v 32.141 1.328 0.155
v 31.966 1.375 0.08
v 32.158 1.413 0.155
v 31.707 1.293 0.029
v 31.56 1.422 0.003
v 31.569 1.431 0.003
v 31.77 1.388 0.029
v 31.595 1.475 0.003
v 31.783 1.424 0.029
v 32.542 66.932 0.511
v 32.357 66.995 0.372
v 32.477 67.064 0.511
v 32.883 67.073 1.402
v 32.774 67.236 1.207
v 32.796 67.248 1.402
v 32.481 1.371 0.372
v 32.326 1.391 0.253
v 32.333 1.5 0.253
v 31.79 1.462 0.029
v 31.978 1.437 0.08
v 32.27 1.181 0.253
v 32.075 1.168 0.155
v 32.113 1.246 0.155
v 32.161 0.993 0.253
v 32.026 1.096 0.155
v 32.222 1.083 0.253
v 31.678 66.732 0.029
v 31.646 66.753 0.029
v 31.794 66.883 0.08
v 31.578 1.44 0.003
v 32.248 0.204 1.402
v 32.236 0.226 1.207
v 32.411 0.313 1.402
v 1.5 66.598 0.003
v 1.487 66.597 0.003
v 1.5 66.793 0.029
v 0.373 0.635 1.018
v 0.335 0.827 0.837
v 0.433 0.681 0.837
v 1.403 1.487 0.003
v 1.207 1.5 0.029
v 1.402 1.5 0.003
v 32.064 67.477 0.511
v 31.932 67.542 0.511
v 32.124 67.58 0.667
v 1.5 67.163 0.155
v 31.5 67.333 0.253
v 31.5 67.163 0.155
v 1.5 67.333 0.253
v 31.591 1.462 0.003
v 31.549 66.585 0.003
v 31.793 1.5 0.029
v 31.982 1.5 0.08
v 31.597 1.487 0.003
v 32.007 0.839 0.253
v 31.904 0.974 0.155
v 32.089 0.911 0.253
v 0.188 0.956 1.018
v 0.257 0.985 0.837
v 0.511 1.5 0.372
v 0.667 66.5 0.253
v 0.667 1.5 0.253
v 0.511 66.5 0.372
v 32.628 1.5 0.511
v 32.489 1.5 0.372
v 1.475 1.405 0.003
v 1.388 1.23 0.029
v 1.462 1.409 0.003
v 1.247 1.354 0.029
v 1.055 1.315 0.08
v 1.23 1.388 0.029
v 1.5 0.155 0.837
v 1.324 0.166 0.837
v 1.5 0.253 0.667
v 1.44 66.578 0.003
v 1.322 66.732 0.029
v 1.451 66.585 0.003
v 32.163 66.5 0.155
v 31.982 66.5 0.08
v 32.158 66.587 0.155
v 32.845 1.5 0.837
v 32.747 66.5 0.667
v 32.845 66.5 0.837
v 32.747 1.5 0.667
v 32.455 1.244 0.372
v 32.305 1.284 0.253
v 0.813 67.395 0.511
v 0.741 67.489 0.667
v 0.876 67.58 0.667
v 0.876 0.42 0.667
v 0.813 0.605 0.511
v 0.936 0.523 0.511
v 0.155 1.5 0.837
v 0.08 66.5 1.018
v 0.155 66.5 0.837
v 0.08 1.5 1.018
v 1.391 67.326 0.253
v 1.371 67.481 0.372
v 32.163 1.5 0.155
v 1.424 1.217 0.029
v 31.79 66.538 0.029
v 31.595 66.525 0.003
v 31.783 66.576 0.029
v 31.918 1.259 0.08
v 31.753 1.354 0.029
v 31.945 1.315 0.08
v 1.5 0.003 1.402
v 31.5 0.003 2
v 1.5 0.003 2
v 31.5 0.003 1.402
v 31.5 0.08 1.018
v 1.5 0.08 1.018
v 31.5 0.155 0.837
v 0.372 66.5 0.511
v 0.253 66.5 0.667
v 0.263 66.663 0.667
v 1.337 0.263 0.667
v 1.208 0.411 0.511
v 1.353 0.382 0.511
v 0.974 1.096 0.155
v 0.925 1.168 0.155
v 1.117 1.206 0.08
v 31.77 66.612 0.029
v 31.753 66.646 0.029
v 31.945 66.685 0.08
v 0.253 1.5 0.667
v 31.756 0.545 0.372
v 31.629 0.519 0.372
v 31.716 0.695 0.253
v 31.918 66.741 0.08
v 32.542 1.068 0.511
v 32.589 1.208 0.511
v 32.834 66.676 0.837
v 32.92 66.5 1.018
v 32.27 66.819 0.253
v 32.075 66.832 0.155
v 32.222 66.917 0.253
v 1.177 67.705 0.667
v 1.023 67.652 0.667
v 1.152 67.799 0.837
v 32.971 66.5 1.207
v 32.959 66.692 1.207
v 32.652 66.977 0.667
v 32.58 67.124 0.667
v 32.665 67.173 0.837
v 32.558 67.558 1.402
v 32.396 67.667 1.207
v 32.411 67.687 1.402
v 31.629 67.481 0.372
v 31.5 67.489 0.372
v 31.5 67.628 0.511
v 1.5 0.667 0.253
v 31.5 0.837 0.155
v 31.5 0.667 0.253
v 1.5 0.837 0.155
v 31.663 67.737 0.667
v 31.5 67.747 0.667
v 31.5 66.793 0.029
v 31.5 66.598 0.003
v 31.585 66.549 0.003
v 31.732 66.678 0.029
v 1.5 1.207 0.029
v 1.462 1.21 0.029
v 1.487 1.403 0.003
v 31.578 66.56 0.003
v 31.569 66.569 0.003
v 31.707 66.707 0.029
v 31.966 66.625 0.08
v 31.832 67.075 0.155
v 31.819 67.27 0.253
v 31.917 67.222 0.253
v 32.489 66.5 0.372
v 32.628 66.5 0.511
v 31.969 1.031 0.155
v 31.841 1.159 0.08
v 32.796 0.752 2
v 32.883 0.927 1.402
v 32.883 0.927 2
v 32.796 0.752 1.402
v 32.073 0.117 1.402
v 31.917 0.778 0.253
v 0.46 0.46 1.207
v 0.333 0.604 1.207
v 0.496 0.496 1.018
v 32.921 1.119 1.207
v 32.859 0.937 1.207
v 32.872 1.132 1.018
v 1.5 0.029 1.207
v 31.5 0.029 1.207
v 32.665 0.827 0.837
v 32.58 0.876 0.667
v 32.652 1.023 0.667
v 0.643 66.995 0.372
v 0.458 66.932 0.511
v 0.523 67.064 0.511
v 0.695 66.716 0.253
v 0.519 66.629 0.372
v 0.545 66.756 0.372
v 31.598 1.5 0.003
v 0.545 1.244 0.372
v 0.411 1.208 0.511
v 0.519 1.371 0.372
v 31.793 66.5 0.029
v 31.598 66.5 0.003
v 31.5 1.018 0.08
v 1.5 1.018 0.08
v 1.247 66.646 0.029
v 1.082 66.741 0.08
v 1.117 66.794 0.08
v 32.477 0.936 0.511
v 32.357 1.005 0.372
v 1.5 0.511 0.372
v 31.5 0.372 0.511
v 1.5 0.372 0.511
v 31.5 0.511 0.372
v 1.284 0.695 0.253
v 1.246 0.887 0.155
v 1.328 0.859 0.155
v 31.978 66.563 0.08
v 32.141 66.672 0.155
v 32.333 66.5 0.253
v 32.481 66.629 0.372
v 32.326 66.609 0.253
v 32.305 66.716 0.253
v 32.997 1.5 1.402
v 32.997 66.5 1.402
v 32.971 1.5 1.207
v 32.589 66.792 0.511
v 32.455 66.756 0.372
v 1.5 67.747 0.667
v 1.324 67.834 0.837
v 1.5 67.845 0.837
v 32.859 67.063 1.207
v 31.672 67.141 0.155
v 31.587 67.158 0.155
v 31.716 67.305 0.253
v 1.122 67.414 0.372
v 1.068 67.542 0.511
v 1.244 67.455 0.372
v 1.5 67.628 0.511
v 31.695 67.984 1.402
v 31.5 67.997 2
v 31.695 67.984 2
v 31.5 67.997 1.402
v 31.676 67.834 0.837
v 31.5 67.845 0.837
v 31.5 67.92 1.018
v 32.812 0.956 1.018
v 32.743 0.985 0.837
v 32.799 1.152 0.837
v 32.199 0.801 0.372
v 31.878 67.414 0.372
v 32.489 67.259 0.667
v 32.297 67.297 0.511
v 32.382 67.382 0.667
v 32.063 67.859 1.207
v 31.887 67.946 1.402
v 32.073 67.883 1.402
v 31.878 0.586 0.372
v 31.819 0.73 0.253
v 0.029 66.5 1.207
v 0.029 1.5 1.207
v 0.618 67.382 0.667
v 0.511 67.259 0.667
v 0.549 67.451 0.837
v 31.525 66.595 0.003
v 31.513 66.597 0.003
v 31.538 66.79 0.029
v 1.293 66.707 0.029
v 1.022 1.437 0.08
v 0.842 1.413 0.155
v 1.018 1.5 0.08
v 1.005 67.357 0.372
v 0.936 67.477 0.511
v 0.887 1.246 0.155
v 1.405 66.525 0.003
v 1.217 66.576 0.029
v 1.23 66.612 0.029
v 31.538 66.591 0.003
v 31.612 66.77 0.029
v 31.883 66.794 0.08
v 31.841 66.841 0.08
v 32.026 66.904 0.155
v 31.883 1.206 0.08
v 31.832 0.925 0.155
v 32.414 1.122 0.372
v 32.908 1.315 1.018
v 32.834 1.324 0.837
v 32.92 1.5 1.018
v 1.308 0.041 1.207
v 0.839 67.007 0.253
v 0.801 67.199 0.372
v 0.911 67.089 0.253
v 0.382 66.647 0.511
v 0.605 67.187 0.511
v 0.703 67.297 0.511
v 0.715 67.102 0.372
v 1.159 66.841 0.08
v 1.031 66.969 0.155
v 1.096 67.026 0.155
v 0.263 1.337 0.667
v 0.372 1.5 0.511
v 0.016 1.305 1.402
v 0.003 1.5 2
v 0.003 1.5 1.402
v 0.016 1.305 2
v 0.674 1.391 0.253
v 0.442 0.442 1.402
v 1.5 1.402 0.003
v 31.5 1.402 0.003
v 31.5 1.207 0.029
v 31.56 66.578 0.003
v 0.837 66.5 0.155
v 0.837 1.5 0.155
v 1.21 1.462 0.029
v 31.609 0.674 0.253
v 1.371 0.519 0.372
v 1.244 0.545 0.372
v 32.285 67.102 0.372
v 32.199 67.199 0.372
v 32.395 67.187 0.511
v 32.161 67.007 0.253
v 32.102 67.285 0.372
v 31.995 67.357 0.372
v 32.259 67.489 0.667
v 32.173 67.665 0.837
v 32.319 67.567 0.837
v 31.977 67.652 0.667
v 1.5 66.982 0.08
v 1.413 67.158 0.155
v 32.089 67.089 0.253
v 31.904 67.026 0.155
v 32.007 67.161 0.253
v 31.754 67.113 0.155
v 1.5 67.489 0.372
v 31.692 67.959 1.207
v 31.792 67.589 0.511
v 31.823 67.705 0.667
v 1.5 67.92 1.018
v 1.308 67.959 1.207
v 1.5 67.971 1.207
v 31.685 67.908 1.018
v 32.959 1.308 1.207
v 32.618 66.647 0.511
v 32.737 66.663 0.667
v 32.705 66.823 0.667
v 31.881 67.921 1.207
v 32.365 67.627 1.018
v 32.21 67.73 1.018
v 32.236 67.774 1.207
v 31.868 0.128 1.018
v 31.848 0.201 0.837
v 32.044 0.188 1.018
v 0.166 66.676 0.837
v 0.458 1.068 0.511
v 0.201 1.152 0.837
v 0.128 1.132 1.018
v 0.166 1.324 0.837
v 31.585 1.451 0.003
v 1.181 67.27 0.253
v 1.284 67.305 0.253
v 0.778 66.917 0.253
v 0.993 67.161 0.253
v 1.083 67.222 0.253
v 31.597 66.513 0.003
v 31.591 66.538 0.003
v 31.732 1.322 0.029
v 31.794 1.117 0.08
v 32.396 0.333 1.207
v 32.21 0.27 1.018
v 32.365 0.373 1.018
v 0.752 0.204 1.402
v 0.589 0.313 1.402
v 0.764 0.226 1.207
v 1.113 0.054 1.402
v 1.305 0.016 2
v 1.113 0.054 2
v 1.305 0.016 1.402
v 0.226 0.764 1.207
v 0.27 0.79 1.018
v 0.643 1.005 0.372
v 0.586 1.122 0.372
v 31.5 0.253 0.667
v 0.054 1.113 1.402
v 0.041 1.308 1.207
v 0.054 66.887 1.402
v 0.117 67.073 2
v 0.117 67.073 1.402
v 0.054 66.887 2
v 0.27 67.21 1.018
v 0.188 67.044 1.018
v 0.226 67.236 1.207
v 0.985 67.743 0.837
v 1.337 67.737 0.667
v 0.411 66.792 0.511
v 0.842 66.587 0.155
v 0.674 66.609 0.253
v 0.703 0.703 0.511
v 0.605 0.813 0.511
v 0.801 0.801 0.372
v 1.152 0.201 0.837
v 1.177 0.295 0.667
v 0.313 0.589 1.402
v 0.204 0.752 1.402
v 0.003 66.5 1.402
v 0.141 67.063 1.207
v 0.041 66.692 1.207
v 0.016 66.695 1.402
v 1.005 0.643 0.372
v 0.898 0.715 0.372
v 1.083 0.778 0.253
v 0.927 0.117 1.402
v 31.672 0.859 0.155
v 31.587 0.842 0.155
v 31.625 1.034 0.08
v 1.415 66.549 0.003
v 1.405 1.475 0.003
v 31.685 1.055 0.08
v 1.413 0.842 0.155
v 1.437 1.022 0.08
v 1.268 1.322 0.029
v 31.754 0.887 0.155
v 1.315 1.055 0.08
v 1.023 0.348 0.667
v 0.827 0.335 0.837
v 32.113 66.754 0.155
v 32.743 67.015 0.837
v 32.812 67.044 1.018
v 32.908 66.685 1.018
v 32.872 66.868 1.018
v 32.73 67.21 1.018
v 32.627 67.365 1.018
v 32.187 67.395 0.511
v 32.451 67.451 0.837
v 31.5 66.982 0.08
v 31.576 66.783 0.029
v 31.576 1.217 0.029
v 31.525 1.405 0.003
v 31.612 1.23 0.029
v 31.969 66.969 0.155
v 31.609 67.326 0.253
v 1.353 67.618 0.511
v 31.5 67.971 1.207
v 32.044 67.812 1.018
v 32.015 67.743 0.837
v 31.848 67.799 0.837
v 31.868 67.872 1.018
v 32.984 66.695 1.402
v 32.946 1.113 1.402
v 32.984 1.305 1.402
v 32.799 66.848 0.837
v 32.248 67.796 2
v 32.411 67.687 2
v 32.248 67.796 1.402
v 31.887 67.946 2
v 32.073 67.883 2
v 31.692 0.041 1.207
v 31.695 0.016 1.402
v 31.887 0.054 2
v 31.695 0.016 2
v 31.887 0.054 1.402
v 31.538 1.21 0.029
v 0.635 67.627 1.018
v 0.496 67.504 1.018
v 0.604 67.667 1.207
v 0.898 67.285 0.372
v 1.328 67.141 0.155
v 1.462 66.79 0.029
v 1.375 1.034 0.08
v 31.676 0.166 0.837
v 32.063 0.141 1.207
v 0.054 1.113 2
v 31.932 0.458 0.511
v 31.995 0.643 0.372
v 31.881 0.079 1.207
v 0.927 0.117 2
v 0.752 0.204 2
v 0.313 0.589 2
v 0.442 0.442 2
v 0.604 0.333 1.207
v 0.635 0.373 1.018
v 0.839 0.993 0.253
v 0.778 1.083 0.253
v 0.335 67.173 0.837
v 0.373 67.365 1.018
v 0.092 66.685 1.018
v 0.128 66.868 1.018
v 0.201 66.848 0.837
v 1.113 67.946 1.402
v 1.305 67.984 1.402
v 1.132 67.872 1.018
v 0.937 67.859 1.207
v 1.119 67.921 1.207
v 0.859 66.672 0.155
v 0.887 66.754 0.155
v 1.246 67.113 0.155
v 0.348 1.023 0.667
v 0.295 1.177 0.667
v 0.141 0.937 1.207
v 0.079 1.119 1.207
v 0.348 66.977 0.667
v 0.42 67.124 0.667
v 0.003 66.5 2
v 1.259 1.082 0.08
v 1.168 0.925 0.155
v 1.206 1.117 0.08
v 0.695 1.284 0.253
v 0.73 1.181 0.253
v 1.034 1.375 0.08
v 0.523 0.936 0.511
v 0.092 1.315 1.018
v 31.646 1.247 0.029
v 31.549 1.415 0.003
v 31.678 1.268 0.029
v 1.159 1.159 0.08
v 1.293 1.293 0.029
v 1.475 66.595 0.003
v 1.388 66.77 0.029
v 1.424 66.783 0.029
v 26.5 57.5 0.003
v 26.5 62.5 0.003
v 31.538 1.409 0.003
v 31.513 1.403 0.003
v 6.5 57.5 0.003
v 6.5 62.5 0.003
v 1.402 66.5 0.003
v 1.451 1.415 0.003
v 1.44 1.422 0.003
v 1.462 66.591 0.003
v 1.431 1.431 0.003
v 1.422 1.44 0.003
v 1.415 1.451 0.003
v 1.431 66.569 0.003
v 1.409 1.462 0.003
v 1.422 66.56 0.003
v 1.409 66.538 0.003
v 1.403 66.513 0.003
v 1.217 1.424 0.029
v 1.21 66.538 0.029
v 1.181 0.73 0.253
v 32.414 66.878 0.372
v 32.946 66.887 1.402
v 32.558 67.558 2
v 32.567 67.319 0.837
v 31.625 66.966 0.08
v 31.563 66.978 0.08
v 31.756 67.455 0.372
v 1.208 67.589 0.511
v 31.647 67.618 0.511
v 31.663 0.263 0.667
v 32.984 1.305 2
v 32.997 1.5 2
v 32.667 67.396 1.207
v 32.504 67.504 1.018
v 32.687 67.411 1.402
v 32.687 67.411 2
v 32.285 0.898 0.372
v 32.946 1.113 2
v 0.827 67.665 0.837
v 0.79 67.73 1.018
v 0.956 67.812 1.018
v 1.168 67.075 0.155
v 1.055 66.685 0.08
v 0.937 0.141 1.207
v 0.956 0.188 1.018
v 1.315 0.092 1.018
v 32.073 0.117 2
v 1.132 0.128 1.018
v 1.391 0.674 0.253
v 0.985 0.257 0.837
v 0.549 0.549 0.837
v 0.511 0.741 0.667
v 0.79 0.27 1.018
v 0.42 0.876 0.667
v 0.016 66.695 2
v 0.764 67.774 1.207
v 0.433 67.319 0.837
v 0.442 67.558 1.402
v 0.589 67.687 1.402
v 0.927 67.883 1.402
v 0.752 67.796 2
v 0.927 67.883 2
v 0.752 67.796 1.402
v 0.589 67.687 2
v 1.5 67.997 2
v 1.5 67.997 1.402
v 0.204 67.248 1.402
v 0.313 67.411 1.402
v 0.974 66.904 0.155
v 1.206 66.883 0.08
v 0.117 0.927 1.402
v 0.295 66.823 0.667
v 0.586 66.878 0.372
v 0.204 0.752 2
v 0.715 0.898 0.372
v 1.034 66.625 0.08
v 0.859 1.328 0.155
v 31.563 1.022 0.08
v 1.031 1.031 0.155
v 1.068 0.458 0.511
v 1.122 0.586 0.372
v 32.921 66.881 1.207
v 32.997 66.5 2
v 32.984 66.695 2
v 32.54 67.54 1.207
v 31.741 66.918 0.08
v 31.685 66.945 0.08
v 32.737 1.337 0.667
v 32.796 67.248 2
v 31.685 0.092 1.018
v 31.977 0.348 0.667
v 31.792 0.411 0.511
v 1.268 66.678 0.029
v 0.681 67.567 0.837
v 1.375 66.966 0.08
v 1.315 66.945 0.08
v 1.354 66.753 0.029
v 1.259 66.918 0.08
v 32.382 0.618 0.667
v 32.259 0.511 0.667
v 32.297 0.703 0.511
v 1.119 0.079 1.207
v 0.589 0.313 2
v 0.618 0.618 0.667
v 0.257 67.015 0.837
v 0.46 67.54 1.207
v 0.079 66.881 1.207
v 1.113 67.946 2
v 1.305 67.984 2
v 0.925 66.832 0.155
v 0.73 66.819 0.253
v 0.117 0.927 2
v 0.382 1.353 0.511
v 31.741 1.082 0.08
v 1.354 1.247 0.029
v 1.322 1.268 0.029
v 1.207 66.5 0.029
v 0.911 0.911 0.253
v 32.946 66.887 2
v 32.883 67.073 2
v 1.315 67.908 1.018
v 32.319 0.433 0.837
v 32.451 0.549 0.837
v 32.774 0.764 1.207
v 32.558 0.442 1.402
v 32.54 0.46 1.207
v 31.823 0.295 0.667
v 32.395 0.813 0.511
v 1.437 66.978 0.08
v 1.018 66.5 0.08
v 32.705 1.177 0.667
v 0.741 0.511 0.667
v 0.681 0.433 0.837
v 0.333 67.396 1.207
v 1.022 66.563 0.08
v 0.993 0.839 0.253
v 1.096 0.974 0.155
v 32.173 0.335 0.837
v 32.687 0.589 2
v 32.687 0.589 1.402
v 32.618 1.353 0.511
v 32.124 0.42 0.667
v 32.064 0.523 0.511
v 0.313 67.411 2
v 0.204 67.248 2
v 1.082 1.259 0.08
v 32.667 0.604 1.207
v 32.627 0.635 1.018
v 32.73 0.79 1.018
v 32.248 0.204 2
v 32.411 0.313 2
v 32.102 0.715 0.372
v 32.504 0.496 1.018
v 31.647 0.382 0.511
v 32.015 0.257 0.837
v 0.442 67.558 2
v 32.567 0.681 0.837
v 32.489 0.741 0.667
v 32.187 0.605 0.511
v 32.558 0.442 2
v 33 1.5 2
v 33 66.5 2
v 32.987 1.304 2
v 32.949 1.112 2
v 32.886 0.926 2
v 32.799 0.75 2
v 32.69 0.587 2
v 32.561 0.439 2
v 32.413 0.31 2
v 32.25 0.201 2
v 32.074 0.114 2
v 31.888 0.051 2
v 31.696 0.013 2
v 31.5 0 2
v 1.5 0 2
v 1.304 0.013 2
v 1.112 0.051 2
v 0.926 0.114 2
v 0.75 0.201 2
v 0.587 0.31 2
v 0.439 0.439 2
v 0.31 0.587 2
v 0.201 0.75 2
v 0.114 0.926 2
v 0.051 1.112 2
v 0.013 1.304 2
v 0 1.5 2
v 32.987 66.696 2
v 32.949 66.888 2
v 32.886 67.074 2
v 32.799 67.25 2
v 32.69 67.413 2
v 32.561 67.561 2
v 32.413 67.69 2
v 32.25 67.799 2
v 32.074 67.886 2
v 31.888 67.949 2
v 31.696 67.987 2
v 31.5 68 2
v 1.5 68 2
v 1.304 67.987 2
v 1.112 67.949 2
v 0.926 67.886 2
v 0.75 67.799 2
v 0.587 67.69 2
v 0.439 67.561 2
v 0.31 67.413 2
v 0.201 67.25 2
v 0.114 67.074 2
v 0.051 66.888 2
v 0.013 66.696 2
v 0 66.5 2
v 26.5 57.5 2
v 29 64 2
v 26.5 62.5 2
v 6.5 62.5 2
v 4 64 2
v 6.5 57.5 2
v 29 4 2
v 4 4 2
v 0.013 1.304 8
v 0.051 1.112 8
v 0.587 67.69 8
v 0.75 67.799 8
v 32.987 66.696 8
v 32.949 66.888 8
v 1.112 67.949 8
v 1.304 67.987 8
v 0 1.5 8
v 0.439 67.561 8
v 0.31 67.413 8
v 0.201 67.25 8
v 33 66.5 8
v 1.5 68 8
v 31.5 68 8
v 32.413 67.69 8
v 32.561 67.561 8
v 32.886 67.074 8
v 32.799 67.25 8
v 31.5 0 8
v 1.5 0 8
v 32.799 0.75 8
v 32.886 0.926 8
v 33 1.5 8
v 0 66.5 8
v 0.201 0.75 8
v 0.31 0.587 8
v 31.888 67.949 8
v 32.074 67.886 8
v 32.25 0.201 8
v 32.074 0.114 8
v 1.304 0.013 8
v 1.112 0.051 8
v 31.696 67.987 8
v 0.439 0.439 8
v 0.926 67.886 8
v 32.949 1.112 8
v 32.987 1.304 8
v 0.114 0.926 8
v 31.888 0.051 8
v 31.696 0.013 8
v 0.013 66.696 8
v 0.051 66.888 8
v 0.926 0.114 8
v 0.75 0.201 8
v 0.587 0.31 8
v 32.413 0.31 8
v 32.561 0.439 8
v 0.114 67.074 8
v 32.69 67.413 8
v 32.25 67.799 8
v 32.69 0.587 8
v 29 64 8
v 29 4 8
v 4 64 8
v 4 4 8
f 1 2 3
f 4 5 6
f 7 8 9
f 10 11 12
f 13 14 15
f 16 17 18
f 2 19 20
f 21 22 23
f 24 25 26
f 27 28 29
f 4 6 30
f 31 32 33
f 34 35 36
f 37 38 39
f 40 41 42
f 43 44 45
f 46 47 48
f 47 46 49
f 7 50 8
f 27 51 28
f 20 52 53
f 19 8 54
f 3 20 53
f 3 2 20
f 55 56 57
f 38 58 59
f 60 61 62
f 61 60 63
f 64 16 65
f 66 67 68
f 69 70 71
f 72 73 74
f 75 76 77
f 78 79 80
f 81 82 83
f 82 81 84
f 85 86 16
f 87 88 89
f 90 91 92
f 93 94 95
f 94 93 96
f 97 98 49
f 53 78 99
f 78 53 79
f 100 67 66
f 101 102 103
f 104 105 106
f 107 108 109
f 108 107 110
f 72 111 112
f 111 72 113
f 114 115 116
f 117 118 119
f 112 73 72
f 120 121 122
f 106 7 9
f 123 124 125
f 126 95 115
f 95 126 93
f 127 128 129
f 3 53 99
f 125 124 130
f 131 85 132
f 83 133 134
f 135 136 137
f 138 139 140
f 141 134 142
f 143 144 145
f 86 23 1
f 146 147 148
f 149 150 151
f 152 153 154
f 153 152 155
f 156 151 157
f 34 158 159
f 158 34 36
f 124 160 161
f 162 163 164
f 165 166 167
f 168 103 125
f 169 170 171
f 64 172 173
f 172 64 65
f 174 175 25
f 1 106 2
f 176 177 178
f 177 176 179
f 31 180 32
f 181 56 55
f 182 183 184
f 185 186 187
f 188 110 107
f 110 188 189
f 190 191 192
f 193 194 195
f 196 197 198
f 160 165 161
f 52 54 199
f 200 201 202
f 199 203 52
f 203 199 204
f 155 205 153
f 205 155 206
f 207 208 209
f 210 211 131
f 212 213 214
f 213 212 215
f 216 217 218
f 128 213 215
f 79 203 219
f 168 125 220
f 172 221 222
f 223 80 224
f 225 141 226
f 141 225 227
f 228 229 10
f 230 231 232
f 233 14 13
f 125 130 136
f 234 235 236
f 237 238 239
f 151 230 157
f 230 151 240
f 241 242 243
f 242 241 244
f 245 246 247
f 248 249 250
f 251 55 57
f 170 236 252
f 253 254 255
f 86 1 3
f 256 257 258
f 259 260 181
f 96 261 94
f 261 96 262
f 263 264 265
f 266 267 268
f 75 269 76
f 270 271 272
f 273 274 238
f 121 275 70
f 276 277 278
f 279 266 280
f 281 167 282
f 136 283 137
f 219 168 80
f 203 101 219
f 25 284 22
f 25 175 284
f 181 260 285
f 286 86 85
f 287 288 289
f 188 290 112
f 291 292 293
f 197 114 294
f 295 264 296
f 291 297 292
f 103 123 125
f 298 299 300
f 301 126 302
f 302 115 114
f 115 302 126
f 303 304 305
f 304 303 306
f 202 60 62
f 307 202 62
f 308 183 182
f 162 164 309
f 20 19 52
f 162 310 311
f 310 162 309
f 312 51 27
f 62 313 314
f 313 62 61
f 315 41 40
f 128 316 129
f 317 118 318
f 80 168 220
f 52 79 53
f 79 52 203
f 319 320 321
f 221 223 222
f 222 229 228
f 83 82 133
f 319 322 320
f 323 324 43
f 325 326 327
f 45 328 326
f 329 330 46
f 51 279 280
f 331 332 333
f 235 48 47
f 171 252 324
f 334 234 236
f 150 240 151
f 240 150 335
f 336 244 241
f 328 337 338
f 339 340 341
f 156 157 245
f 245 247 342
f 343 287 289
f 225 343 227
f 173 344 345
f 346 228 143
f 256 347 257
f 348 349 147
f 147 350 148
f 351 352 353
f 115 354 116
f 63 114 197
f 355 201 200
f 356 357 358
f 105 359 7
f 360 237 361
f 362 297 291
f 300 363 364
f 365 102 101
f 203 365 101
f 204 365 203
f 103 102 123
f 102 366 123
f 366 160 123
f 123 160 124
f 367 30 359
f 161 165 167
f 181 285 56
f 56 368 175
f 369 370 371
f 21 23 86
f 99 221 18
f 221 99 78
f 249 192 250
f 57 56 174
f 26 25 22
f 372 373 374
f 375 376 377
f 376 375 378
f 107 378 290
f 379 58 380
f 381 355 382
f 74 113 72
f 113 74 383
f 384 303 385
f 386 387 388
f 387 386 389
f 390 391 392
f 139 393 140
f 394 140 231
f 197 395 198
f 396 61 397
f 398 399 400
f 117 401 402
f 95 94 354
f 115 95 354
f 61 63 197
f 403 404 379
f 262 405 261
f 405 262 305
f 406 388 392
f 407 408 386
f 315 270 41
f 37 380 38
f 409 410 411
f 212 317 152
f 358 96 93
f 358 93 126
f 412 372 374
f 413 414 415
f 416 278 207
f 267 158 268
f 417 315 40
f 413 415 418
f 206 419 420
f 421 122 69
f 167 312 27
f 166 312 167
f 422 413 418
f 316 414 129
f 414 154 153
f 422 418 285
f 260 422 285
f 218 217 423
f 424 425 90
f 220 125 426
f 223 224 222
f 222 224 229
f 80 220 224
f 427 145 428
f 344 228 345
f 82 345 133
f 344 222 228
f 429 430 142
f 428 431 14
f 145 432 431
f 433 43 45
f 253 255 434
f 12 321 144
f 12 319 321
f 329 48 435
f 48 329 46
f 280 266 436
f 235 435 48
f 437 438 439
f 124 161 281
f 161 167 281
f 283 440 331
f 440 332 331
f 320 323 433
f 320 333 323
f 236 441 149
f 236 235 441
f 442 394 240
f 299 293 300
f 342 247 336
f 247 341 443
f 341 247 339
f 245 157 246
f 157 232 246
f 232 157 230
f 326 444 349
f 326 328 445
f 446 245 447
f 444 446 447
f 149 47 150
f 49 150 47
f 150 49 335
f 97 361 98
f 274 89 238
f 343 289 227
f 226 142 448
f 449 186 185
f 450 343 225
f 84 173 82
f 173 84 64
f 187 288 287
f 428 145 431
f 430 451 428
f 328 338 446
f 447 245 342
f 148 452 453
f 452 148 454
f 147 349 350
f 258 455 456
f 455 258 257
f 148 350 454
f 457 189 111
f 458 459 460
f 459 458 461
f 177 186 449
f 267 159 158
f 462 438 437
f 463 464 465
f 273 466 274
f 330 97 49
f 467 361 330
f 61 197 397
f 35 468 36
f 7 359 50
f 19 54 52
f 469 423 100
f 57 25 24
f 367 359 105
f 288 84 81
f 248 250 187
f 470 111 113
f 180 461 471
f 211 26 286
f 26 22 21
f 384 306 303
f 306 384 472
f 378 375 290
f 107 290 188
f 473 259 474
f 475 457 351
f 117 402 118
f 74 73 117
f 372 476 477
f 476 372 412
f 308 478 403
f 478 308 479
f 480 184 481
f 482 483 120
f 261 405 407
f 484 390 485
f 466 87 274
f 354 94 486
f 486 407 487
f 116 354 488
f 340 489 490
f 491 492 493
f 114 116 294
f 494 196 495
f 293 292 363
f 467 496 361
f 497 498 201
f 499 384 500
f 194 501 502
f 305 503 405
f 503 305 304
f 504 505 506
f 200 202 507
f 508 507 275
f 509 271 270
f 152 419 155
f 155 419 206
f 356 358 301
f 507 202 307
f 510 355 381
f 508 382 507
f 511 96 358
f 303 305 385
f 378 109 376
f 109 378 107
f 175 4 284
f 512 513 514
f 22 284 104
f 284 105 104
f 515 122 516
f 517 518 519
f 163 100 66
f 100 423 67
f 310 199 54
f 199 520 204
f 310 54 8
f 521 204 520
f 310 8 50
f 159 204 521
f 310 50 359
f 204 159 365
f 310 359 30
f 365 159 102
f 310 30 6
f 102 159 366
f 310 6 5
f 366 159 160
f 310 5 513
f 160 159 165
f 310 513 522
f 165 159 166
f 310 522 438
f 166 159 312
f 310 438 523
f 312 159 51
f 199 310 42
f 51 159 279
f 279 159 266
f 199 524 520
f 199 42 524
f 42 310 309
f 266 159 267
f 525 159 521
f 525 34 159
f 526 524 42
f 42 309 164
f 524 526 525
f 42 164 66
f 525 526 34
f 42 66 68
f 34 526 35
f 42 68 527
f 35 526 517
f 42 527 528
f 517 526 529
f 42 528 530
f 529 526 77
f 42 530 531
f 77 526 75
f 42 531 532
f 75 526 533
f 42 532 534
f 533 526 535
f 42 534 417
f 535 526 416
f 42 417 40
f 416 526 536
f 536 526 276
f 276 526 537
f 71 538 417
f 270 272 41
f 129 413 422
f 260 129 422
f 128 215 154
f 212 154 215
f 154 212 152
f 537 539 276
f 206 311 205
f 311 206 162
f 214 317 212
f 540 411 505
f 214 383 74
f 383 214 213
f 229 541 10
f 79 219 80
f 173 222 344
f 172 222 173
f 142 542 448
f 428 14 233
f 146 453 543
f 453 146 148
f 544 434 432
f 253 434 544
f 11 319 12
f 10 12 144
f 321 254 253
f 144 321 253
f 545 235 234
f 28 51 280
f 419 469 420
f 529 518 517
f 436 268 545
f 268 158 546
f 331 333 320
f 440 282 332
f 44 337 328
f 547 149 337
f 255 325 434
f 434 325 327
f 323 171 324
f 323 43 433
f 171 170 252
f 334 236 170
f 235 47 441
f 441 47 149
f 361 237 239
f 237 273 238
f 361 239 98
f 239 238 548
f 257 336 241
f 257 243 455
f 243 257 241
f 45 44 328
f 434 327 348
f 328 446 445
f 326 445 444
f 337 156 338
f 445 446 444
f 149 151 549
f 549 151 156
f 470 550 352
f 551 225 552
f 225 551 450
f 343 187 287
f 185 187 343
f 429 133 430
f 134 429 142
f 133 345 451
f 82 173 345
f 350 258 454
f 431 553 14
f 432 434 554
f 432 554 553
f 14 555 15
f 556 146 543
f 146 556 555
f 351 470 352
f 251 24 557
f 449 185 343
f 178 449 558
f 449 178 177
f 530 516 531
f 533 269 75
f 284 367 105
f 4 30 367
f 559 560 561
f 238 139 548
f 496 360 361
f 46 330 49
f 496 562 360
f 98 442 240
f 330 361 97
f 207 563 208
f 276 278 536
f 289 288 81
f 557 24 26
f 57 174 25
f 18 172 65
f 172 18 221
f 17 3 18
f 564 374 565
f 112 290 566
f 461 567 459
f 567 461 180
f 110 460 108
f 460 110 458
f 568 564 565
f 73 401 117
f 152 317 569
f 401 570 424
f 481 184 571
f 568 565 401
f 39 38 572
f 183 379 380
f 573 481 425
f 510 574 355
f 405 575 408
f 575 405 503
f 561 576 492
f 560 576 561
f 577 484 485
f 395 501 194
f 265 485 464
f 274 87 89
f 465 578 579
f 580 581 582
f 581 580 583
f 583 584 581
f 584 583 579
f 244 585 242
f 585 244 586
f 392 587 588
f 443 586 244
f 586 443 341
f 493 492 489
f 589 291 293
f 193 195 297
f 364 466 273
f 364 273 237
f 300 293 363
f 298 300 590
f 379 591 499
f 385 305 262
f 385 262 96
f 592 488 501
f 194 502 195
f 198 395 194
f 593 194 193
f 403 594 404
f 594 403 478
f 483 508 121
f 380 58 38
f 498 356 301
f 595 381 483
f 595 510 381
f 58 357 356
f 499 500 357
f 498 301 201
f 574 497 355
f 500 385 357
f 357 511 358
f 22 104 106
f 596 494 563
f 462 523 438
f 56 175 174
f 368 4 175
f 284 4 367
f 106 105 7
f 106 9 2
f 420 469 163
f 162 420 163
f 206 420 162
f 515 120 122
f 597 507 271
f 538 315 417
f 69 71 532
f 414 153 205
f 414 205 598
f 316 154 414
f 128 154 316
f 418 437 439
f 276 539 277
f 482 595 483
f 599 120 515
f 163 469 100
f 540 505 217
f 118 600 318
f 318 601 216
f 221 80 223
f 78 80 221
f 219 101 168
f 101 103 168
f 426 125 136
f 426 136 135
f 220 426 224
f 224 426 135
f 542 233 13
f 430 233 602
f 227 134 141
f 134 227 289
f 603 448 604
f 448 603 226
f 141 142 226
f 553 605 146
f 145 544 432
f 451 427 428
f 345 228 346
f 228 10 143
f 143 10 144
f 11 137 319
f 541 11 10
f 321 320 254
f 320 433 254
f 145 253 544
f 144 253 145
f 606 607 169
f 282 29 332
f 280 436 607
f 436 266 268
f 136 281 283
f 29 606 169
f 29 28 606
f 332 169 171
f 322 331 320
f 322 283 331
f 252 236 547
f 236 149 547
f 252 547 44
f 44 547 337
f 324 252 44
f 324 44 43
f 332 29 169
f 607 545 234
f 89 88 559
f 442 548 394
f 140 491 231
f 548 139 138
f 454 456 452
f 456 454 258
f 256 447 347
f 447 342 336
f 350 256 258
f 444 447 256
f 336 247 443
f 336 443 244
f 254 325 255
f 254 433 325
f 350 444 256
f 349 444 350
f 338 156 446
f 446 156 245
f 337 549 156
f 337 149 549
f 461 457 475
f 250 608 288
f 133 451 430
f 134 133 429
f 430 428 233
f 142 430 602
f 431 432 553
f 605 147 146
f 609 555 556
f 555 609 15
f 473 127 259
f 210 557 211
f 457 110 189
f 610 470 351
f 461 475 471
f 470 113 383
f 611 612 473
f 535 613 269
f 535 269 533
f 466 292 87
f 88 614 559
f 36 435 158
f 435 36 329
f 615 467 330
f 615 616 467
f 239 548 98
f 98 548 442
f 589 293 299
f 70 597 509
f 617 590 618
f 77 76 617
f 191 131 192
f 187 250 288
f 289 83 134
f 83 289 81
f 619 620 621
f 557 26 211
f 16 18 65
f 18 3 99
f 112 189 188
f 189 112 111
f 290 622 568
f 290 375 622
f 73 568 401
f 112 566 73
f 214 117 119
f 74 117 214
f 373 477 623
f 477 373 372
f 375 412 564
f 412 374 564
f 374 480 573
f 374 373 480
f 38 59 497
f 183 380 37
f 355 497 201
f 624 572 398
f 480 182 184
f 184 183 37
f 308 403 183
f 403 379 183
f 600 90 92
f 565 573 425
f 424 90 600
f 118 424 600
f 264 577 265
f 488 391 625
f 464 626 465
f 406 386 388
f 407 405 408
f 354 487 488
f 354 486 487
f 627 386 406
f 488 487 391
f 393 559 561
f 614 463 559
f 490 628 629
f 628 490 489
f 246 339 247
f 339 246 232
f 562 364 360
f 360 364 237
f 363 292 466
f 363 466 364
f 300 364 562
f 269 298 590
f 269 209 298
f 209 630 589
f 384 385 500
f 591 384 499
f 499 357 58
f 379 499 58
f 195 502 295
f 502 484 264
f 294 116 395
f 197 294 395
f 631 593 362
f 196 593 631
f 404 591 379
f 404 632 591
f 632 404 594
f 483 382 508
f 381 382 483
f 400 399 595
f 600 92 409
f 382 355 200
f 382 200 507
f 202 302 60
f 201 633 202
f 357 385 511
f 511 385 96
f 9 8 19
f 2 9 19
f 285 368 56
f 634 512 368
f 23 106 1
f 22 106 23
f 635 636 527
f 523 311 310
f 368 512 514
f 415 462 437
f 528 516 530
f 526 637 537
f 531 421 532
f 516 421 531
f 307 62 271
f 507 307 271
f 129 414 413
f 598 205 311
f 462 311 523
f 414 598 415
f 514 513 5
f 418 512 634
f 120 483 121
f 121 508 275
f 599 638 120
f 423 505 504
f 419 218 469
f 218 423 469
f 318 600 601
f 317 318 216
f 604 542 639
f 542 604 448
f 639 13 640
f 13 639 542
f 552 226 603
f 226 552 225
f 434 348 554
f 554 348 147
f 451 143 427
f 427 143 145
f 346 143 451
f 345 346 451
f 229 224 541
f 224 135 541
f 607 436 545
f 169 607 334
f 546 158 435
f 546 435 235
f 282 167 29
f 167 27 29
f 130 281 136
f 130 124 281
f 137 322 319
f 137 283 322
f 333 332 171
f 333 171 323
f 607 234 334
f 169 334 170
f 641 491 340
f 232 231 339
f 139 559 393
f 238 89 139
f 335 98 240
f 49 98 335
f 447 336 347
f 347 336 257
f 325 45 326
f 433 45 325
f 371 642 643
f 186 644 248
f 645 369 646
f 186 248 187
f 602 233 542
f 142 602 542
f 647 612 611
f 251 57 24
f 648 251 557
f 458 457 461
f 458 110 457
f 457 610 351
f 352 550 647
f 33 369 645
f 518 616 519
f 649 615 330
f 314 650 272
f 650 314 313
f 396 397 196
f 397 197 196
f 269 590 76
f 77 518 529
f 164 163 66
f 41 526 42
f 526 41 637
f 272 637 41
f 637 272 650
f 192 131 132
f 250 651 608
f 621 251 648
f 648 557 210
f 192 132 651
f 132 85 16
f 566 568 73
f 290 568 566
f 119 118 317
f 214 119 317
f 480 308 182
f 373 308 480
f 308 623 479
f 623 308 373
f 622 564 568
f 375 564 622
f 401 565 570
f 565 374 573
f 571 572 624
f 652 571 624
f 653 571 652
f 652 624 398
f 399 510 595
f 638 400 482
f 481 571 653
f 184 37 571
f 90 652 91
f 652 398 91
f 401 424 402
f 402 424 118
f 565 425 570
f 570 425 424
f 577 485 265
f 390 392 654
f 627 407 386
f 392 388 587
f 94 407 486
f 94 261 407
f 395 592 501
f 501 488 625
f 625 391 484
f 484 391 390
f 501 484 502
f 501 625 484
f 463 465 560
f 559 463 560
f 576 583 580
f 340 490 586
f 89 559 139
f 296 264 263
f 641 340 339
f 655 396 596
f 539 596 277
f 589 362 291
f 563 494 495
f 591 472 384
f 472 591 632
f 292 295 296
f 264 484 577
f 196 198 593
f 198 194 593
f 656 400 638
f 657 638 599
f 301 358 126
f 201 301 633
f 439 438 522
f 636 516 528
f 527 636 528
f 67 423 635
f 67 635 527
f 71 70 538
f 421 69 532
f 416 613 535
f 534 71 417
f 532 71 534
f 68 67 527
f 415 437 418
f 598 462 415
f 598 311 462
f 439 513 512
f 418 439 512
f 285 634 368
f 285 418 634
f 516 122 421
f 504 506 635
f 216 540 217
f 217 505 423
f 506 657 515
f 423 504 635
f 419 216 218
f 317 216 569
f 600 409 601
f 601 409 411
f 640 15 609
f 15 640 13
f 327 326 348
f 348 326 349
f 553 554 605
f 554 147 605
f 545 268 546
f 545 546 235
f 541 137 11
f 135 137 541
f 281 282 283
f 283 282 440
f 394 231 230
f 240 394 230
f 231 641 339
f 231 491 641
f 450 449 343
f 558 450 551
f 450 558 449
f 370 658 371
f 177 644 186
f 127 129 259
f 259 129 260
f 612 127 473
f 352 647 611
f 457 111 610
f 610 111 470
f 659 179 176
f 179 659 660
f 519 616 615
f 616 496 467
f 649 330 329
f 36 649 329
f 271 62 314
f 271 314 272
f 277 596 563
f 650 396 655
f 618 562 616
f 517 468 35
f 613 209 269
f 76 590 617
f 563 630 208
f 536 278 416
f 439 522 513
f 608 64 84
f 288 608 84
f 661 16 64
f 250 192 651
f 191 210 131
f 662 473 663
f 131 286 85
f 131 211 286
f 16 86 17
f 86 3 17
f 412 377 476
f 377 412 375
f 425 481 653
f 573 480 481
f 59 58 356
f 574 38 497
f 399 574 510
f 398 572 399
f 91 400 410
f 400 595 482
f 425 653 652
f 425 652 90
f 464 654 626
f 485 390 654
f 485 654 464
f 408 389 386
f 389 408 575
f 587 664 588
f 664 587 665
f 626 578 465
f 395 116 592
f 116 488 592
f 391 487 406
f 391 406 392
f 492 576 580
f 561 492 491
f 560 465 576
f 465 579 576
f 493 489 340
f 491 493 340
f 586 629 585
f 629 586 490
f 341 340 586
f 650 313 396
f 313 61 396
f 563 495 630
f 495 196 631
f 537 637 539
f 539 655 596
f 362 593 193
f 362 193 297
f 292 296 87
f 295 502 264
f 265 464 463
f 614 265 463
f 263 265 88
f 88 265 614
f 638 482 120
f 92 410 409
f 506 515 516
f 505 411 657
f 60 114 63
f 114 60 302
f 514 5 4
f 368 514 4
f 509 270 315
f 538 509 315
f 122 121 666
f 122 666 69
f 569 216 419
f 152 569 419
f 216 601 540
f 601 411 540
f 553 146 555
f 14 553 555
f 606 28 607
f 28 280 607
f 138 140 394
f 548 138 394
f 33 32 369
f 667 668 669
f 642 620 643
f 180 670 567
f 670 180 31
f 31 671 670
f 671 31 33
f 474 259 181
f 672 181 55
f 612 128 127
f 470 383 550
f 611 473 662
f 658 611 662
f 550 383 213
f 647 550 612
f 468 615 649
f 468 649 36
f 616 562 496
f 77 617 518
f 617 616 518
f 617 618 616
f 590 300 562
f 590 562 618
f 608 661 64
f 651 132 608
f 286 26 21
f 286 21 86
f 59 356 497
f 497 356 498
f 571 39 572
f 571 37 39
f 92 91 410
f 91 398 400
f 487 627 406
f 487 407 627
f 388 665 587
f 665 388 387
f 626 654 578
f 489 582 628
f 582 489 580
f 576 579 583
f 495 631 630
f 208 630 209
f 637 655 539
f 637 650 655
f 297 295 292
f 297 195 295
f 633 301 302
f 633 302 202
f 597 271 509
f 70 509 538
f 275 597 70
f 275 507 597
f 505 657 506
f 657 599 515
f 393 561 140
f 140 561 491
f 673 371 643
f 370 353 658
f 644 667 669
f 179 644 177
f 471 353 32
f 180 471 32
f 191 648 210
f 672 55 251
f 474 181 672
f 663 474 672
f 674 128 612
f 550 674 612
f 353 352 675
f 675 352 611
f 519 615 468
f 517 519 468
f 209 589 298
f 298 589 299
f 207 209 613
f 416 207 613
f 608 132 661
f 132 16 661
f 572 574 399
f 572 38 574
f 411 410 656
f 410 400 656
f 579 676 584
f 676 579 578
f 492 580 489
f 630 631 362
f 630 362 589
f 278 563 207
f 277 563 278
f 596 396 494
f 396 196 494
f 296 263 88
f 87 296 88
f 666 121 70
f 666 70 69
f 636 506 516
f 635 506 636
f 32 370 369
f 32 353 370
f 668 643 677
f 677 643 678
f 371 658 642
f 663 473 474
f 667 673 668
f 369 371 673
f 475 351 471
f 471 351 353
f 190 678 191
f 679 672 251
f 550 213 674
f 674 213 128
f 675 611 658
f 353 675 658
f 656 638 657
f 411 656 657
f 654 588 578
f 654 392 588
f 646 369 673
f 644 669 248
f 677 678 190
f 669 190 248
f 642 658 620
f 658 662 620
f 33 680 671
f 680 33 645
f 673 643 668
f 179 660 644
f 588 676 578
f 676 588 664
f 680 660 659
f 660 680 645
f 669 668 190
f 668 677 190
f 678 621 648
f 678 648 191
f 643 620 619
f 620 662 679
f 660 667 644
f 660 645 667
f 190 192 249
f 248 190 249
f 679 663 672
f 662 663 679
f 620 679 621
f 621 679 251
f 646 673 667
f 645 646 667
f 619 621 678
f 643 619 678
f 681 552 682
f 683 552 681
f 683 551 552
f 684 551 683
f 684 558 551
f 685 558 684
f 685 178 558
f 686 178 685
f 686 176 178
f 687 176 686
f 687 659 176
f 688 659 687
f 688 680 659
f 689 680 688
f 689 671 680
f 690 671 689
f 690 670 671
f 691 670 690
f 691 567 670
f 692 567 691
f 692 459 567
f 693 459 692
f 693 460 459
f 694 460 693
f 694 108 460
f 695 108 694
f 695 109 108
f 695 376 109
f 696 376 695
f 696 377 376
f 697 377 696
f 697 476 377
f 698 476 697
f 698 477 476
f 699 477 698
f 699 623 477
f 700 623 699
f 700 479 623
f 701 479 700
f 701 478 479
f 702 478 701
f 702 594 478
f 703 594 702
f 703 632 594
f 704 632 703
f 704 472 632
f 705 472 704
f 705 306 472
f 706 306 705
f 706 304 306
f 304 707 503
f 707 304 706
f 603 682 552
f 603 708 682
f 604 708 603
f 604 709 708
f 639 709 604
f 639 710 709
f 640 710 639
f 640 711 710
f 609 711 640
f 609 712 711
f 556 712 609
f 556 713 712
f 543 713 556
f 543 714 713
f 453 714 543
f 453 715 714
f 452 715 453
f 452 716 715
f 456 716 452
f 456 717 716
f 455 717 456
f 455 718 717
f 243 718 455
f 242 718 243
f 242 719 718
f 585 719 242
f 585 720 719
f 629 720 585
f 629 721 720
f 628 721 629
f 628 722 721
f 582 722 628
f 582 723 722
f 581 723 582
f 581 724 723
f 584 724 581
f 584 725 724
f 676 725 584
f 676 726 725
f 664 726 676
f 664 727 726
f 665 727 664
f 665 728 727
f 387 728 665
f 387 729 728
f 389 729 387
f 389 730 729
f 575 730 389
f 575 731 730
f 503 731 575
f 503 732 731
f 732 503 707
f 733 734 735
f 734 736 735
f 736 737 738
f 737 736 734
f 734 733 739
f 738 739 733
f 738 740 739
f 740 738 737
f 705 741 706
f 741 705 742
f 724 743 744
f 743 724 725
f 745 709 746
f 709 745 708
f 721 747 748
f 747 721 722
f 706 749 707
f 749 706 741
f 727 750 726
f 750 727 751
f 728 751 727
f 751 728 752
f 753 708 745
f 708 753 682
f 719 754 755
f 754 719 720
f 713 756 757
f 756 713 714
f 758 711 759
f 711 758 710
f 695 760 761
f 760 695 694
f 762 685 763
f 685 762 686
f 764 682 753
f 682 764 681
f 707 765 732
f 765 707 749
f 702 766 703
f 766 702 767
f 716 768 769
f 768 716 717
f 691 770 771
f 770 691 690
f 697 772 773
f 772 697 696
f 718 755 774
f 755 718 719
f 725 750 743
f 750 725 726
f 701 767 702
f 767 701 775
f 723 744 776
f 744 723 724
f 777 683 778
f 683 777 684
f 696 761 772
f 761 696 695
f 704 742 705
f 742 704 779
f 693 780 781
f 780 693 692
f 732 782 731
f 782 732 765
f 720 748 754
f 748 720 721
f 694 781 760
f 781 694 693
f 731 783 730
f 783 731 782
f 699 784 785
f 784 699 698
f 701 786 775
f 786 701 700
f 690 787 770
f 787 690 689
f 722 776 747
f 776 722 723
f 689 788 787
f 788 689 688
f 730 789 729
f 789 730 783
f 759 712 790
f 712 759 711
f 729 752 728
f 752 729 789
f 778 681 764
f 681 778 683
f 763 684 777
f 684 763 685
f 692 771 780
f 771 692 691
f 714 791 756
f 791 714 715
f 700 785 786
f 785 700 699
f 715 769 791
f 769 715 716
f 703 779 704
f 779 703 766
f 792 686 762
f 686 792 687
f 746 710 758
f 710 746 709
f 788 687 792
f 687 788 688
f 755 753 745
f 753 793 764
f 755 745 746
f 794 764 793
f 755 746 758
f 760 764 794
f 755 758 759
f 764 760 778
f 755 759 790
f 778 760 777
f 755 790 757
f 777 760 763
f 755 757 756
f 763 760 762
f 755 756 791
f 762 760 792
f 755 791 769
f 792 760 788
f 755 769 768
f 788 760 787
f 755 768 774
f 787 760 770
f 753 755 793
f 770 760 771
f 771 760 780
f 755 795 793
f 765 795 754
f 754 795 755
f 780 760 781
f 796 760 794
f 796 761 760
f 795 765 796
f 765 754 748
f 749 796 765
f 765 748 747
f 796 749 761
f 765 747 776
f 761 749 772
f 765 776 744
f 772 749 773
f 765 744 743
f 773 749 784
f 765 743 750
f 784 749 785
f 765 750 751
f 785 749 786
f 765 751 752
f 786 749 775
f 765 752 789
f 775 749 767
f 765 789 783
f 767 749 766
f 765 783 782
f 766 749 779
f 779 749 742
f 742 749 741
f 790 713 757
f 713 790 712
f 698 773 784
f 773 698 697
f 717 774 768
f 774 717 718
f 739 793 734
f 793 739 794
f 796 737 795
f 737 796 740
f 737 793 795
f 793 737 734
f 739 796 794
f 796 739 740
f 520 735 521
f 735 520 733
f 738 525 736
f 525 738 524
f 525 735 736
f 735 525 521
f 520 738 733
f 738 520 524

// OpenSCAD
// ============================================================
// Open Tray — 4-walled box, open top, with bottom slit
//
// A simple open-top tray with four closed walls and a floor.
// A rectangular slit passes through the bottom for cable /
// strap routing. Only the outside of the floor is rounded.
//
// Coordinate system:
//   X = width  (short side, 25 mm inner)
//   Y = length (long side,  60 mm inner)
//   Z = height (up from the bed, 6 mm inner)
//
// All units: millimeters.
// ============================================================

/* [Box Dimensions] */
inner_w  = 25;   // Inner width  (X)
inner_l  = 60;   // Inner length (Y)
inner_h  = 6;    // Inner height (Z)

/* [Wall & Floor] */
wall_t   = 4;    // Wall thickness
floor_t  = 2;    // Floor thickness

/* [Floor Round] */
floor_round_r = 1.5;  // Outside roundover radius on the floor perimeter

/* [Bottom Slit] */
slit_w   = 20;   // Slit width  along X (parallel to the 25 mm side)
slit_d   = 5;    // Slit depth  along Y
slit_x   = 0;    // Slit centre X offset from box centre
slit_y   = 26;   // Slit centre Y offset from box centre

/* [Quality] */
$fn      = 48;
$fa      = 1;
$fs      = 0.4;

// ============================================================
// DERIVED
// ============================================================

outer_w = inner_w + 2 * wall_t;
outer_l = inner_l + 2 * wall_t;
outer_h = inner_h + floor_t;

// ============================================================
// GEOMETRY
// ============================================================

module floor_block() {
    // Rounded only on the OUTSIDE of the floor. The top face stays flat
    // so the walls can sit on it cleanly.
    r = min(floor_round_r,
            floor_t - 0.01,
            outer_w / 2 - 0.01,
            outer_l / 2 - 0.01);

    if (r <= 0)
        cube([outer_w, outer_l, floor_t]);
    else
        intersection() {
            minkowski() {
                translate([r, r, r])
                    cube([outer_w - 2 * r,
                          outer_l - 2 * r,
                          floor_t - r]);
                sphere(r = r);
            }

            // Trim the top back to a flat floor surface.
            cube([outer_w, outer_l, floor_t]);
        }
}

module rounded_rect_2d(w, h, r) {
    corner_r = min(r, w / 2 - 0.01, h / 2 - 0.01);
    hull() {
        translate([ corner_r,         corner_r        ]) circle(r = corner_r);
        translate([ w - corner_r,     corner_r        ]) circle(r = corner_r);
        translate([ corner_r,         h - corner_r    ]) circle(r = corner_r);
        translate([ w - corner_r,     h - corner_r    ]) circle(r = corner_r);
    }
}

module wall_ring() {
    outer_corner_r = min(floor_round_r,
                         outer_w / 2 - 0.01,
                         outer_l / 2 - 0.01);

    translate([0, 0, floor_t])
        difference() {
            linear_extrude(height = inner_h)
                rounded_rect_2d(outer_w, outer_l, outer_corner_r);
            translate([wall_t, wall_t, -0.01])
                cube([inner_w, inner_l, inner_h + 0.02]);
        }
}

module open_tray() {
    cx = outer_w / 2;
    cy = outer_l / 2;

    difference() {
        union() {
            floor_block();
            wall_ring();
        }

        // ----- Bottom slit -----
        translate([cx + slit_x, cy + slit_y, floor_t / 2])
            cube([slit_w, slit_d, floor_t + 2], center = true);
    }
}

// ============================================================
// RENDER
// ============================================================

open_tray();
